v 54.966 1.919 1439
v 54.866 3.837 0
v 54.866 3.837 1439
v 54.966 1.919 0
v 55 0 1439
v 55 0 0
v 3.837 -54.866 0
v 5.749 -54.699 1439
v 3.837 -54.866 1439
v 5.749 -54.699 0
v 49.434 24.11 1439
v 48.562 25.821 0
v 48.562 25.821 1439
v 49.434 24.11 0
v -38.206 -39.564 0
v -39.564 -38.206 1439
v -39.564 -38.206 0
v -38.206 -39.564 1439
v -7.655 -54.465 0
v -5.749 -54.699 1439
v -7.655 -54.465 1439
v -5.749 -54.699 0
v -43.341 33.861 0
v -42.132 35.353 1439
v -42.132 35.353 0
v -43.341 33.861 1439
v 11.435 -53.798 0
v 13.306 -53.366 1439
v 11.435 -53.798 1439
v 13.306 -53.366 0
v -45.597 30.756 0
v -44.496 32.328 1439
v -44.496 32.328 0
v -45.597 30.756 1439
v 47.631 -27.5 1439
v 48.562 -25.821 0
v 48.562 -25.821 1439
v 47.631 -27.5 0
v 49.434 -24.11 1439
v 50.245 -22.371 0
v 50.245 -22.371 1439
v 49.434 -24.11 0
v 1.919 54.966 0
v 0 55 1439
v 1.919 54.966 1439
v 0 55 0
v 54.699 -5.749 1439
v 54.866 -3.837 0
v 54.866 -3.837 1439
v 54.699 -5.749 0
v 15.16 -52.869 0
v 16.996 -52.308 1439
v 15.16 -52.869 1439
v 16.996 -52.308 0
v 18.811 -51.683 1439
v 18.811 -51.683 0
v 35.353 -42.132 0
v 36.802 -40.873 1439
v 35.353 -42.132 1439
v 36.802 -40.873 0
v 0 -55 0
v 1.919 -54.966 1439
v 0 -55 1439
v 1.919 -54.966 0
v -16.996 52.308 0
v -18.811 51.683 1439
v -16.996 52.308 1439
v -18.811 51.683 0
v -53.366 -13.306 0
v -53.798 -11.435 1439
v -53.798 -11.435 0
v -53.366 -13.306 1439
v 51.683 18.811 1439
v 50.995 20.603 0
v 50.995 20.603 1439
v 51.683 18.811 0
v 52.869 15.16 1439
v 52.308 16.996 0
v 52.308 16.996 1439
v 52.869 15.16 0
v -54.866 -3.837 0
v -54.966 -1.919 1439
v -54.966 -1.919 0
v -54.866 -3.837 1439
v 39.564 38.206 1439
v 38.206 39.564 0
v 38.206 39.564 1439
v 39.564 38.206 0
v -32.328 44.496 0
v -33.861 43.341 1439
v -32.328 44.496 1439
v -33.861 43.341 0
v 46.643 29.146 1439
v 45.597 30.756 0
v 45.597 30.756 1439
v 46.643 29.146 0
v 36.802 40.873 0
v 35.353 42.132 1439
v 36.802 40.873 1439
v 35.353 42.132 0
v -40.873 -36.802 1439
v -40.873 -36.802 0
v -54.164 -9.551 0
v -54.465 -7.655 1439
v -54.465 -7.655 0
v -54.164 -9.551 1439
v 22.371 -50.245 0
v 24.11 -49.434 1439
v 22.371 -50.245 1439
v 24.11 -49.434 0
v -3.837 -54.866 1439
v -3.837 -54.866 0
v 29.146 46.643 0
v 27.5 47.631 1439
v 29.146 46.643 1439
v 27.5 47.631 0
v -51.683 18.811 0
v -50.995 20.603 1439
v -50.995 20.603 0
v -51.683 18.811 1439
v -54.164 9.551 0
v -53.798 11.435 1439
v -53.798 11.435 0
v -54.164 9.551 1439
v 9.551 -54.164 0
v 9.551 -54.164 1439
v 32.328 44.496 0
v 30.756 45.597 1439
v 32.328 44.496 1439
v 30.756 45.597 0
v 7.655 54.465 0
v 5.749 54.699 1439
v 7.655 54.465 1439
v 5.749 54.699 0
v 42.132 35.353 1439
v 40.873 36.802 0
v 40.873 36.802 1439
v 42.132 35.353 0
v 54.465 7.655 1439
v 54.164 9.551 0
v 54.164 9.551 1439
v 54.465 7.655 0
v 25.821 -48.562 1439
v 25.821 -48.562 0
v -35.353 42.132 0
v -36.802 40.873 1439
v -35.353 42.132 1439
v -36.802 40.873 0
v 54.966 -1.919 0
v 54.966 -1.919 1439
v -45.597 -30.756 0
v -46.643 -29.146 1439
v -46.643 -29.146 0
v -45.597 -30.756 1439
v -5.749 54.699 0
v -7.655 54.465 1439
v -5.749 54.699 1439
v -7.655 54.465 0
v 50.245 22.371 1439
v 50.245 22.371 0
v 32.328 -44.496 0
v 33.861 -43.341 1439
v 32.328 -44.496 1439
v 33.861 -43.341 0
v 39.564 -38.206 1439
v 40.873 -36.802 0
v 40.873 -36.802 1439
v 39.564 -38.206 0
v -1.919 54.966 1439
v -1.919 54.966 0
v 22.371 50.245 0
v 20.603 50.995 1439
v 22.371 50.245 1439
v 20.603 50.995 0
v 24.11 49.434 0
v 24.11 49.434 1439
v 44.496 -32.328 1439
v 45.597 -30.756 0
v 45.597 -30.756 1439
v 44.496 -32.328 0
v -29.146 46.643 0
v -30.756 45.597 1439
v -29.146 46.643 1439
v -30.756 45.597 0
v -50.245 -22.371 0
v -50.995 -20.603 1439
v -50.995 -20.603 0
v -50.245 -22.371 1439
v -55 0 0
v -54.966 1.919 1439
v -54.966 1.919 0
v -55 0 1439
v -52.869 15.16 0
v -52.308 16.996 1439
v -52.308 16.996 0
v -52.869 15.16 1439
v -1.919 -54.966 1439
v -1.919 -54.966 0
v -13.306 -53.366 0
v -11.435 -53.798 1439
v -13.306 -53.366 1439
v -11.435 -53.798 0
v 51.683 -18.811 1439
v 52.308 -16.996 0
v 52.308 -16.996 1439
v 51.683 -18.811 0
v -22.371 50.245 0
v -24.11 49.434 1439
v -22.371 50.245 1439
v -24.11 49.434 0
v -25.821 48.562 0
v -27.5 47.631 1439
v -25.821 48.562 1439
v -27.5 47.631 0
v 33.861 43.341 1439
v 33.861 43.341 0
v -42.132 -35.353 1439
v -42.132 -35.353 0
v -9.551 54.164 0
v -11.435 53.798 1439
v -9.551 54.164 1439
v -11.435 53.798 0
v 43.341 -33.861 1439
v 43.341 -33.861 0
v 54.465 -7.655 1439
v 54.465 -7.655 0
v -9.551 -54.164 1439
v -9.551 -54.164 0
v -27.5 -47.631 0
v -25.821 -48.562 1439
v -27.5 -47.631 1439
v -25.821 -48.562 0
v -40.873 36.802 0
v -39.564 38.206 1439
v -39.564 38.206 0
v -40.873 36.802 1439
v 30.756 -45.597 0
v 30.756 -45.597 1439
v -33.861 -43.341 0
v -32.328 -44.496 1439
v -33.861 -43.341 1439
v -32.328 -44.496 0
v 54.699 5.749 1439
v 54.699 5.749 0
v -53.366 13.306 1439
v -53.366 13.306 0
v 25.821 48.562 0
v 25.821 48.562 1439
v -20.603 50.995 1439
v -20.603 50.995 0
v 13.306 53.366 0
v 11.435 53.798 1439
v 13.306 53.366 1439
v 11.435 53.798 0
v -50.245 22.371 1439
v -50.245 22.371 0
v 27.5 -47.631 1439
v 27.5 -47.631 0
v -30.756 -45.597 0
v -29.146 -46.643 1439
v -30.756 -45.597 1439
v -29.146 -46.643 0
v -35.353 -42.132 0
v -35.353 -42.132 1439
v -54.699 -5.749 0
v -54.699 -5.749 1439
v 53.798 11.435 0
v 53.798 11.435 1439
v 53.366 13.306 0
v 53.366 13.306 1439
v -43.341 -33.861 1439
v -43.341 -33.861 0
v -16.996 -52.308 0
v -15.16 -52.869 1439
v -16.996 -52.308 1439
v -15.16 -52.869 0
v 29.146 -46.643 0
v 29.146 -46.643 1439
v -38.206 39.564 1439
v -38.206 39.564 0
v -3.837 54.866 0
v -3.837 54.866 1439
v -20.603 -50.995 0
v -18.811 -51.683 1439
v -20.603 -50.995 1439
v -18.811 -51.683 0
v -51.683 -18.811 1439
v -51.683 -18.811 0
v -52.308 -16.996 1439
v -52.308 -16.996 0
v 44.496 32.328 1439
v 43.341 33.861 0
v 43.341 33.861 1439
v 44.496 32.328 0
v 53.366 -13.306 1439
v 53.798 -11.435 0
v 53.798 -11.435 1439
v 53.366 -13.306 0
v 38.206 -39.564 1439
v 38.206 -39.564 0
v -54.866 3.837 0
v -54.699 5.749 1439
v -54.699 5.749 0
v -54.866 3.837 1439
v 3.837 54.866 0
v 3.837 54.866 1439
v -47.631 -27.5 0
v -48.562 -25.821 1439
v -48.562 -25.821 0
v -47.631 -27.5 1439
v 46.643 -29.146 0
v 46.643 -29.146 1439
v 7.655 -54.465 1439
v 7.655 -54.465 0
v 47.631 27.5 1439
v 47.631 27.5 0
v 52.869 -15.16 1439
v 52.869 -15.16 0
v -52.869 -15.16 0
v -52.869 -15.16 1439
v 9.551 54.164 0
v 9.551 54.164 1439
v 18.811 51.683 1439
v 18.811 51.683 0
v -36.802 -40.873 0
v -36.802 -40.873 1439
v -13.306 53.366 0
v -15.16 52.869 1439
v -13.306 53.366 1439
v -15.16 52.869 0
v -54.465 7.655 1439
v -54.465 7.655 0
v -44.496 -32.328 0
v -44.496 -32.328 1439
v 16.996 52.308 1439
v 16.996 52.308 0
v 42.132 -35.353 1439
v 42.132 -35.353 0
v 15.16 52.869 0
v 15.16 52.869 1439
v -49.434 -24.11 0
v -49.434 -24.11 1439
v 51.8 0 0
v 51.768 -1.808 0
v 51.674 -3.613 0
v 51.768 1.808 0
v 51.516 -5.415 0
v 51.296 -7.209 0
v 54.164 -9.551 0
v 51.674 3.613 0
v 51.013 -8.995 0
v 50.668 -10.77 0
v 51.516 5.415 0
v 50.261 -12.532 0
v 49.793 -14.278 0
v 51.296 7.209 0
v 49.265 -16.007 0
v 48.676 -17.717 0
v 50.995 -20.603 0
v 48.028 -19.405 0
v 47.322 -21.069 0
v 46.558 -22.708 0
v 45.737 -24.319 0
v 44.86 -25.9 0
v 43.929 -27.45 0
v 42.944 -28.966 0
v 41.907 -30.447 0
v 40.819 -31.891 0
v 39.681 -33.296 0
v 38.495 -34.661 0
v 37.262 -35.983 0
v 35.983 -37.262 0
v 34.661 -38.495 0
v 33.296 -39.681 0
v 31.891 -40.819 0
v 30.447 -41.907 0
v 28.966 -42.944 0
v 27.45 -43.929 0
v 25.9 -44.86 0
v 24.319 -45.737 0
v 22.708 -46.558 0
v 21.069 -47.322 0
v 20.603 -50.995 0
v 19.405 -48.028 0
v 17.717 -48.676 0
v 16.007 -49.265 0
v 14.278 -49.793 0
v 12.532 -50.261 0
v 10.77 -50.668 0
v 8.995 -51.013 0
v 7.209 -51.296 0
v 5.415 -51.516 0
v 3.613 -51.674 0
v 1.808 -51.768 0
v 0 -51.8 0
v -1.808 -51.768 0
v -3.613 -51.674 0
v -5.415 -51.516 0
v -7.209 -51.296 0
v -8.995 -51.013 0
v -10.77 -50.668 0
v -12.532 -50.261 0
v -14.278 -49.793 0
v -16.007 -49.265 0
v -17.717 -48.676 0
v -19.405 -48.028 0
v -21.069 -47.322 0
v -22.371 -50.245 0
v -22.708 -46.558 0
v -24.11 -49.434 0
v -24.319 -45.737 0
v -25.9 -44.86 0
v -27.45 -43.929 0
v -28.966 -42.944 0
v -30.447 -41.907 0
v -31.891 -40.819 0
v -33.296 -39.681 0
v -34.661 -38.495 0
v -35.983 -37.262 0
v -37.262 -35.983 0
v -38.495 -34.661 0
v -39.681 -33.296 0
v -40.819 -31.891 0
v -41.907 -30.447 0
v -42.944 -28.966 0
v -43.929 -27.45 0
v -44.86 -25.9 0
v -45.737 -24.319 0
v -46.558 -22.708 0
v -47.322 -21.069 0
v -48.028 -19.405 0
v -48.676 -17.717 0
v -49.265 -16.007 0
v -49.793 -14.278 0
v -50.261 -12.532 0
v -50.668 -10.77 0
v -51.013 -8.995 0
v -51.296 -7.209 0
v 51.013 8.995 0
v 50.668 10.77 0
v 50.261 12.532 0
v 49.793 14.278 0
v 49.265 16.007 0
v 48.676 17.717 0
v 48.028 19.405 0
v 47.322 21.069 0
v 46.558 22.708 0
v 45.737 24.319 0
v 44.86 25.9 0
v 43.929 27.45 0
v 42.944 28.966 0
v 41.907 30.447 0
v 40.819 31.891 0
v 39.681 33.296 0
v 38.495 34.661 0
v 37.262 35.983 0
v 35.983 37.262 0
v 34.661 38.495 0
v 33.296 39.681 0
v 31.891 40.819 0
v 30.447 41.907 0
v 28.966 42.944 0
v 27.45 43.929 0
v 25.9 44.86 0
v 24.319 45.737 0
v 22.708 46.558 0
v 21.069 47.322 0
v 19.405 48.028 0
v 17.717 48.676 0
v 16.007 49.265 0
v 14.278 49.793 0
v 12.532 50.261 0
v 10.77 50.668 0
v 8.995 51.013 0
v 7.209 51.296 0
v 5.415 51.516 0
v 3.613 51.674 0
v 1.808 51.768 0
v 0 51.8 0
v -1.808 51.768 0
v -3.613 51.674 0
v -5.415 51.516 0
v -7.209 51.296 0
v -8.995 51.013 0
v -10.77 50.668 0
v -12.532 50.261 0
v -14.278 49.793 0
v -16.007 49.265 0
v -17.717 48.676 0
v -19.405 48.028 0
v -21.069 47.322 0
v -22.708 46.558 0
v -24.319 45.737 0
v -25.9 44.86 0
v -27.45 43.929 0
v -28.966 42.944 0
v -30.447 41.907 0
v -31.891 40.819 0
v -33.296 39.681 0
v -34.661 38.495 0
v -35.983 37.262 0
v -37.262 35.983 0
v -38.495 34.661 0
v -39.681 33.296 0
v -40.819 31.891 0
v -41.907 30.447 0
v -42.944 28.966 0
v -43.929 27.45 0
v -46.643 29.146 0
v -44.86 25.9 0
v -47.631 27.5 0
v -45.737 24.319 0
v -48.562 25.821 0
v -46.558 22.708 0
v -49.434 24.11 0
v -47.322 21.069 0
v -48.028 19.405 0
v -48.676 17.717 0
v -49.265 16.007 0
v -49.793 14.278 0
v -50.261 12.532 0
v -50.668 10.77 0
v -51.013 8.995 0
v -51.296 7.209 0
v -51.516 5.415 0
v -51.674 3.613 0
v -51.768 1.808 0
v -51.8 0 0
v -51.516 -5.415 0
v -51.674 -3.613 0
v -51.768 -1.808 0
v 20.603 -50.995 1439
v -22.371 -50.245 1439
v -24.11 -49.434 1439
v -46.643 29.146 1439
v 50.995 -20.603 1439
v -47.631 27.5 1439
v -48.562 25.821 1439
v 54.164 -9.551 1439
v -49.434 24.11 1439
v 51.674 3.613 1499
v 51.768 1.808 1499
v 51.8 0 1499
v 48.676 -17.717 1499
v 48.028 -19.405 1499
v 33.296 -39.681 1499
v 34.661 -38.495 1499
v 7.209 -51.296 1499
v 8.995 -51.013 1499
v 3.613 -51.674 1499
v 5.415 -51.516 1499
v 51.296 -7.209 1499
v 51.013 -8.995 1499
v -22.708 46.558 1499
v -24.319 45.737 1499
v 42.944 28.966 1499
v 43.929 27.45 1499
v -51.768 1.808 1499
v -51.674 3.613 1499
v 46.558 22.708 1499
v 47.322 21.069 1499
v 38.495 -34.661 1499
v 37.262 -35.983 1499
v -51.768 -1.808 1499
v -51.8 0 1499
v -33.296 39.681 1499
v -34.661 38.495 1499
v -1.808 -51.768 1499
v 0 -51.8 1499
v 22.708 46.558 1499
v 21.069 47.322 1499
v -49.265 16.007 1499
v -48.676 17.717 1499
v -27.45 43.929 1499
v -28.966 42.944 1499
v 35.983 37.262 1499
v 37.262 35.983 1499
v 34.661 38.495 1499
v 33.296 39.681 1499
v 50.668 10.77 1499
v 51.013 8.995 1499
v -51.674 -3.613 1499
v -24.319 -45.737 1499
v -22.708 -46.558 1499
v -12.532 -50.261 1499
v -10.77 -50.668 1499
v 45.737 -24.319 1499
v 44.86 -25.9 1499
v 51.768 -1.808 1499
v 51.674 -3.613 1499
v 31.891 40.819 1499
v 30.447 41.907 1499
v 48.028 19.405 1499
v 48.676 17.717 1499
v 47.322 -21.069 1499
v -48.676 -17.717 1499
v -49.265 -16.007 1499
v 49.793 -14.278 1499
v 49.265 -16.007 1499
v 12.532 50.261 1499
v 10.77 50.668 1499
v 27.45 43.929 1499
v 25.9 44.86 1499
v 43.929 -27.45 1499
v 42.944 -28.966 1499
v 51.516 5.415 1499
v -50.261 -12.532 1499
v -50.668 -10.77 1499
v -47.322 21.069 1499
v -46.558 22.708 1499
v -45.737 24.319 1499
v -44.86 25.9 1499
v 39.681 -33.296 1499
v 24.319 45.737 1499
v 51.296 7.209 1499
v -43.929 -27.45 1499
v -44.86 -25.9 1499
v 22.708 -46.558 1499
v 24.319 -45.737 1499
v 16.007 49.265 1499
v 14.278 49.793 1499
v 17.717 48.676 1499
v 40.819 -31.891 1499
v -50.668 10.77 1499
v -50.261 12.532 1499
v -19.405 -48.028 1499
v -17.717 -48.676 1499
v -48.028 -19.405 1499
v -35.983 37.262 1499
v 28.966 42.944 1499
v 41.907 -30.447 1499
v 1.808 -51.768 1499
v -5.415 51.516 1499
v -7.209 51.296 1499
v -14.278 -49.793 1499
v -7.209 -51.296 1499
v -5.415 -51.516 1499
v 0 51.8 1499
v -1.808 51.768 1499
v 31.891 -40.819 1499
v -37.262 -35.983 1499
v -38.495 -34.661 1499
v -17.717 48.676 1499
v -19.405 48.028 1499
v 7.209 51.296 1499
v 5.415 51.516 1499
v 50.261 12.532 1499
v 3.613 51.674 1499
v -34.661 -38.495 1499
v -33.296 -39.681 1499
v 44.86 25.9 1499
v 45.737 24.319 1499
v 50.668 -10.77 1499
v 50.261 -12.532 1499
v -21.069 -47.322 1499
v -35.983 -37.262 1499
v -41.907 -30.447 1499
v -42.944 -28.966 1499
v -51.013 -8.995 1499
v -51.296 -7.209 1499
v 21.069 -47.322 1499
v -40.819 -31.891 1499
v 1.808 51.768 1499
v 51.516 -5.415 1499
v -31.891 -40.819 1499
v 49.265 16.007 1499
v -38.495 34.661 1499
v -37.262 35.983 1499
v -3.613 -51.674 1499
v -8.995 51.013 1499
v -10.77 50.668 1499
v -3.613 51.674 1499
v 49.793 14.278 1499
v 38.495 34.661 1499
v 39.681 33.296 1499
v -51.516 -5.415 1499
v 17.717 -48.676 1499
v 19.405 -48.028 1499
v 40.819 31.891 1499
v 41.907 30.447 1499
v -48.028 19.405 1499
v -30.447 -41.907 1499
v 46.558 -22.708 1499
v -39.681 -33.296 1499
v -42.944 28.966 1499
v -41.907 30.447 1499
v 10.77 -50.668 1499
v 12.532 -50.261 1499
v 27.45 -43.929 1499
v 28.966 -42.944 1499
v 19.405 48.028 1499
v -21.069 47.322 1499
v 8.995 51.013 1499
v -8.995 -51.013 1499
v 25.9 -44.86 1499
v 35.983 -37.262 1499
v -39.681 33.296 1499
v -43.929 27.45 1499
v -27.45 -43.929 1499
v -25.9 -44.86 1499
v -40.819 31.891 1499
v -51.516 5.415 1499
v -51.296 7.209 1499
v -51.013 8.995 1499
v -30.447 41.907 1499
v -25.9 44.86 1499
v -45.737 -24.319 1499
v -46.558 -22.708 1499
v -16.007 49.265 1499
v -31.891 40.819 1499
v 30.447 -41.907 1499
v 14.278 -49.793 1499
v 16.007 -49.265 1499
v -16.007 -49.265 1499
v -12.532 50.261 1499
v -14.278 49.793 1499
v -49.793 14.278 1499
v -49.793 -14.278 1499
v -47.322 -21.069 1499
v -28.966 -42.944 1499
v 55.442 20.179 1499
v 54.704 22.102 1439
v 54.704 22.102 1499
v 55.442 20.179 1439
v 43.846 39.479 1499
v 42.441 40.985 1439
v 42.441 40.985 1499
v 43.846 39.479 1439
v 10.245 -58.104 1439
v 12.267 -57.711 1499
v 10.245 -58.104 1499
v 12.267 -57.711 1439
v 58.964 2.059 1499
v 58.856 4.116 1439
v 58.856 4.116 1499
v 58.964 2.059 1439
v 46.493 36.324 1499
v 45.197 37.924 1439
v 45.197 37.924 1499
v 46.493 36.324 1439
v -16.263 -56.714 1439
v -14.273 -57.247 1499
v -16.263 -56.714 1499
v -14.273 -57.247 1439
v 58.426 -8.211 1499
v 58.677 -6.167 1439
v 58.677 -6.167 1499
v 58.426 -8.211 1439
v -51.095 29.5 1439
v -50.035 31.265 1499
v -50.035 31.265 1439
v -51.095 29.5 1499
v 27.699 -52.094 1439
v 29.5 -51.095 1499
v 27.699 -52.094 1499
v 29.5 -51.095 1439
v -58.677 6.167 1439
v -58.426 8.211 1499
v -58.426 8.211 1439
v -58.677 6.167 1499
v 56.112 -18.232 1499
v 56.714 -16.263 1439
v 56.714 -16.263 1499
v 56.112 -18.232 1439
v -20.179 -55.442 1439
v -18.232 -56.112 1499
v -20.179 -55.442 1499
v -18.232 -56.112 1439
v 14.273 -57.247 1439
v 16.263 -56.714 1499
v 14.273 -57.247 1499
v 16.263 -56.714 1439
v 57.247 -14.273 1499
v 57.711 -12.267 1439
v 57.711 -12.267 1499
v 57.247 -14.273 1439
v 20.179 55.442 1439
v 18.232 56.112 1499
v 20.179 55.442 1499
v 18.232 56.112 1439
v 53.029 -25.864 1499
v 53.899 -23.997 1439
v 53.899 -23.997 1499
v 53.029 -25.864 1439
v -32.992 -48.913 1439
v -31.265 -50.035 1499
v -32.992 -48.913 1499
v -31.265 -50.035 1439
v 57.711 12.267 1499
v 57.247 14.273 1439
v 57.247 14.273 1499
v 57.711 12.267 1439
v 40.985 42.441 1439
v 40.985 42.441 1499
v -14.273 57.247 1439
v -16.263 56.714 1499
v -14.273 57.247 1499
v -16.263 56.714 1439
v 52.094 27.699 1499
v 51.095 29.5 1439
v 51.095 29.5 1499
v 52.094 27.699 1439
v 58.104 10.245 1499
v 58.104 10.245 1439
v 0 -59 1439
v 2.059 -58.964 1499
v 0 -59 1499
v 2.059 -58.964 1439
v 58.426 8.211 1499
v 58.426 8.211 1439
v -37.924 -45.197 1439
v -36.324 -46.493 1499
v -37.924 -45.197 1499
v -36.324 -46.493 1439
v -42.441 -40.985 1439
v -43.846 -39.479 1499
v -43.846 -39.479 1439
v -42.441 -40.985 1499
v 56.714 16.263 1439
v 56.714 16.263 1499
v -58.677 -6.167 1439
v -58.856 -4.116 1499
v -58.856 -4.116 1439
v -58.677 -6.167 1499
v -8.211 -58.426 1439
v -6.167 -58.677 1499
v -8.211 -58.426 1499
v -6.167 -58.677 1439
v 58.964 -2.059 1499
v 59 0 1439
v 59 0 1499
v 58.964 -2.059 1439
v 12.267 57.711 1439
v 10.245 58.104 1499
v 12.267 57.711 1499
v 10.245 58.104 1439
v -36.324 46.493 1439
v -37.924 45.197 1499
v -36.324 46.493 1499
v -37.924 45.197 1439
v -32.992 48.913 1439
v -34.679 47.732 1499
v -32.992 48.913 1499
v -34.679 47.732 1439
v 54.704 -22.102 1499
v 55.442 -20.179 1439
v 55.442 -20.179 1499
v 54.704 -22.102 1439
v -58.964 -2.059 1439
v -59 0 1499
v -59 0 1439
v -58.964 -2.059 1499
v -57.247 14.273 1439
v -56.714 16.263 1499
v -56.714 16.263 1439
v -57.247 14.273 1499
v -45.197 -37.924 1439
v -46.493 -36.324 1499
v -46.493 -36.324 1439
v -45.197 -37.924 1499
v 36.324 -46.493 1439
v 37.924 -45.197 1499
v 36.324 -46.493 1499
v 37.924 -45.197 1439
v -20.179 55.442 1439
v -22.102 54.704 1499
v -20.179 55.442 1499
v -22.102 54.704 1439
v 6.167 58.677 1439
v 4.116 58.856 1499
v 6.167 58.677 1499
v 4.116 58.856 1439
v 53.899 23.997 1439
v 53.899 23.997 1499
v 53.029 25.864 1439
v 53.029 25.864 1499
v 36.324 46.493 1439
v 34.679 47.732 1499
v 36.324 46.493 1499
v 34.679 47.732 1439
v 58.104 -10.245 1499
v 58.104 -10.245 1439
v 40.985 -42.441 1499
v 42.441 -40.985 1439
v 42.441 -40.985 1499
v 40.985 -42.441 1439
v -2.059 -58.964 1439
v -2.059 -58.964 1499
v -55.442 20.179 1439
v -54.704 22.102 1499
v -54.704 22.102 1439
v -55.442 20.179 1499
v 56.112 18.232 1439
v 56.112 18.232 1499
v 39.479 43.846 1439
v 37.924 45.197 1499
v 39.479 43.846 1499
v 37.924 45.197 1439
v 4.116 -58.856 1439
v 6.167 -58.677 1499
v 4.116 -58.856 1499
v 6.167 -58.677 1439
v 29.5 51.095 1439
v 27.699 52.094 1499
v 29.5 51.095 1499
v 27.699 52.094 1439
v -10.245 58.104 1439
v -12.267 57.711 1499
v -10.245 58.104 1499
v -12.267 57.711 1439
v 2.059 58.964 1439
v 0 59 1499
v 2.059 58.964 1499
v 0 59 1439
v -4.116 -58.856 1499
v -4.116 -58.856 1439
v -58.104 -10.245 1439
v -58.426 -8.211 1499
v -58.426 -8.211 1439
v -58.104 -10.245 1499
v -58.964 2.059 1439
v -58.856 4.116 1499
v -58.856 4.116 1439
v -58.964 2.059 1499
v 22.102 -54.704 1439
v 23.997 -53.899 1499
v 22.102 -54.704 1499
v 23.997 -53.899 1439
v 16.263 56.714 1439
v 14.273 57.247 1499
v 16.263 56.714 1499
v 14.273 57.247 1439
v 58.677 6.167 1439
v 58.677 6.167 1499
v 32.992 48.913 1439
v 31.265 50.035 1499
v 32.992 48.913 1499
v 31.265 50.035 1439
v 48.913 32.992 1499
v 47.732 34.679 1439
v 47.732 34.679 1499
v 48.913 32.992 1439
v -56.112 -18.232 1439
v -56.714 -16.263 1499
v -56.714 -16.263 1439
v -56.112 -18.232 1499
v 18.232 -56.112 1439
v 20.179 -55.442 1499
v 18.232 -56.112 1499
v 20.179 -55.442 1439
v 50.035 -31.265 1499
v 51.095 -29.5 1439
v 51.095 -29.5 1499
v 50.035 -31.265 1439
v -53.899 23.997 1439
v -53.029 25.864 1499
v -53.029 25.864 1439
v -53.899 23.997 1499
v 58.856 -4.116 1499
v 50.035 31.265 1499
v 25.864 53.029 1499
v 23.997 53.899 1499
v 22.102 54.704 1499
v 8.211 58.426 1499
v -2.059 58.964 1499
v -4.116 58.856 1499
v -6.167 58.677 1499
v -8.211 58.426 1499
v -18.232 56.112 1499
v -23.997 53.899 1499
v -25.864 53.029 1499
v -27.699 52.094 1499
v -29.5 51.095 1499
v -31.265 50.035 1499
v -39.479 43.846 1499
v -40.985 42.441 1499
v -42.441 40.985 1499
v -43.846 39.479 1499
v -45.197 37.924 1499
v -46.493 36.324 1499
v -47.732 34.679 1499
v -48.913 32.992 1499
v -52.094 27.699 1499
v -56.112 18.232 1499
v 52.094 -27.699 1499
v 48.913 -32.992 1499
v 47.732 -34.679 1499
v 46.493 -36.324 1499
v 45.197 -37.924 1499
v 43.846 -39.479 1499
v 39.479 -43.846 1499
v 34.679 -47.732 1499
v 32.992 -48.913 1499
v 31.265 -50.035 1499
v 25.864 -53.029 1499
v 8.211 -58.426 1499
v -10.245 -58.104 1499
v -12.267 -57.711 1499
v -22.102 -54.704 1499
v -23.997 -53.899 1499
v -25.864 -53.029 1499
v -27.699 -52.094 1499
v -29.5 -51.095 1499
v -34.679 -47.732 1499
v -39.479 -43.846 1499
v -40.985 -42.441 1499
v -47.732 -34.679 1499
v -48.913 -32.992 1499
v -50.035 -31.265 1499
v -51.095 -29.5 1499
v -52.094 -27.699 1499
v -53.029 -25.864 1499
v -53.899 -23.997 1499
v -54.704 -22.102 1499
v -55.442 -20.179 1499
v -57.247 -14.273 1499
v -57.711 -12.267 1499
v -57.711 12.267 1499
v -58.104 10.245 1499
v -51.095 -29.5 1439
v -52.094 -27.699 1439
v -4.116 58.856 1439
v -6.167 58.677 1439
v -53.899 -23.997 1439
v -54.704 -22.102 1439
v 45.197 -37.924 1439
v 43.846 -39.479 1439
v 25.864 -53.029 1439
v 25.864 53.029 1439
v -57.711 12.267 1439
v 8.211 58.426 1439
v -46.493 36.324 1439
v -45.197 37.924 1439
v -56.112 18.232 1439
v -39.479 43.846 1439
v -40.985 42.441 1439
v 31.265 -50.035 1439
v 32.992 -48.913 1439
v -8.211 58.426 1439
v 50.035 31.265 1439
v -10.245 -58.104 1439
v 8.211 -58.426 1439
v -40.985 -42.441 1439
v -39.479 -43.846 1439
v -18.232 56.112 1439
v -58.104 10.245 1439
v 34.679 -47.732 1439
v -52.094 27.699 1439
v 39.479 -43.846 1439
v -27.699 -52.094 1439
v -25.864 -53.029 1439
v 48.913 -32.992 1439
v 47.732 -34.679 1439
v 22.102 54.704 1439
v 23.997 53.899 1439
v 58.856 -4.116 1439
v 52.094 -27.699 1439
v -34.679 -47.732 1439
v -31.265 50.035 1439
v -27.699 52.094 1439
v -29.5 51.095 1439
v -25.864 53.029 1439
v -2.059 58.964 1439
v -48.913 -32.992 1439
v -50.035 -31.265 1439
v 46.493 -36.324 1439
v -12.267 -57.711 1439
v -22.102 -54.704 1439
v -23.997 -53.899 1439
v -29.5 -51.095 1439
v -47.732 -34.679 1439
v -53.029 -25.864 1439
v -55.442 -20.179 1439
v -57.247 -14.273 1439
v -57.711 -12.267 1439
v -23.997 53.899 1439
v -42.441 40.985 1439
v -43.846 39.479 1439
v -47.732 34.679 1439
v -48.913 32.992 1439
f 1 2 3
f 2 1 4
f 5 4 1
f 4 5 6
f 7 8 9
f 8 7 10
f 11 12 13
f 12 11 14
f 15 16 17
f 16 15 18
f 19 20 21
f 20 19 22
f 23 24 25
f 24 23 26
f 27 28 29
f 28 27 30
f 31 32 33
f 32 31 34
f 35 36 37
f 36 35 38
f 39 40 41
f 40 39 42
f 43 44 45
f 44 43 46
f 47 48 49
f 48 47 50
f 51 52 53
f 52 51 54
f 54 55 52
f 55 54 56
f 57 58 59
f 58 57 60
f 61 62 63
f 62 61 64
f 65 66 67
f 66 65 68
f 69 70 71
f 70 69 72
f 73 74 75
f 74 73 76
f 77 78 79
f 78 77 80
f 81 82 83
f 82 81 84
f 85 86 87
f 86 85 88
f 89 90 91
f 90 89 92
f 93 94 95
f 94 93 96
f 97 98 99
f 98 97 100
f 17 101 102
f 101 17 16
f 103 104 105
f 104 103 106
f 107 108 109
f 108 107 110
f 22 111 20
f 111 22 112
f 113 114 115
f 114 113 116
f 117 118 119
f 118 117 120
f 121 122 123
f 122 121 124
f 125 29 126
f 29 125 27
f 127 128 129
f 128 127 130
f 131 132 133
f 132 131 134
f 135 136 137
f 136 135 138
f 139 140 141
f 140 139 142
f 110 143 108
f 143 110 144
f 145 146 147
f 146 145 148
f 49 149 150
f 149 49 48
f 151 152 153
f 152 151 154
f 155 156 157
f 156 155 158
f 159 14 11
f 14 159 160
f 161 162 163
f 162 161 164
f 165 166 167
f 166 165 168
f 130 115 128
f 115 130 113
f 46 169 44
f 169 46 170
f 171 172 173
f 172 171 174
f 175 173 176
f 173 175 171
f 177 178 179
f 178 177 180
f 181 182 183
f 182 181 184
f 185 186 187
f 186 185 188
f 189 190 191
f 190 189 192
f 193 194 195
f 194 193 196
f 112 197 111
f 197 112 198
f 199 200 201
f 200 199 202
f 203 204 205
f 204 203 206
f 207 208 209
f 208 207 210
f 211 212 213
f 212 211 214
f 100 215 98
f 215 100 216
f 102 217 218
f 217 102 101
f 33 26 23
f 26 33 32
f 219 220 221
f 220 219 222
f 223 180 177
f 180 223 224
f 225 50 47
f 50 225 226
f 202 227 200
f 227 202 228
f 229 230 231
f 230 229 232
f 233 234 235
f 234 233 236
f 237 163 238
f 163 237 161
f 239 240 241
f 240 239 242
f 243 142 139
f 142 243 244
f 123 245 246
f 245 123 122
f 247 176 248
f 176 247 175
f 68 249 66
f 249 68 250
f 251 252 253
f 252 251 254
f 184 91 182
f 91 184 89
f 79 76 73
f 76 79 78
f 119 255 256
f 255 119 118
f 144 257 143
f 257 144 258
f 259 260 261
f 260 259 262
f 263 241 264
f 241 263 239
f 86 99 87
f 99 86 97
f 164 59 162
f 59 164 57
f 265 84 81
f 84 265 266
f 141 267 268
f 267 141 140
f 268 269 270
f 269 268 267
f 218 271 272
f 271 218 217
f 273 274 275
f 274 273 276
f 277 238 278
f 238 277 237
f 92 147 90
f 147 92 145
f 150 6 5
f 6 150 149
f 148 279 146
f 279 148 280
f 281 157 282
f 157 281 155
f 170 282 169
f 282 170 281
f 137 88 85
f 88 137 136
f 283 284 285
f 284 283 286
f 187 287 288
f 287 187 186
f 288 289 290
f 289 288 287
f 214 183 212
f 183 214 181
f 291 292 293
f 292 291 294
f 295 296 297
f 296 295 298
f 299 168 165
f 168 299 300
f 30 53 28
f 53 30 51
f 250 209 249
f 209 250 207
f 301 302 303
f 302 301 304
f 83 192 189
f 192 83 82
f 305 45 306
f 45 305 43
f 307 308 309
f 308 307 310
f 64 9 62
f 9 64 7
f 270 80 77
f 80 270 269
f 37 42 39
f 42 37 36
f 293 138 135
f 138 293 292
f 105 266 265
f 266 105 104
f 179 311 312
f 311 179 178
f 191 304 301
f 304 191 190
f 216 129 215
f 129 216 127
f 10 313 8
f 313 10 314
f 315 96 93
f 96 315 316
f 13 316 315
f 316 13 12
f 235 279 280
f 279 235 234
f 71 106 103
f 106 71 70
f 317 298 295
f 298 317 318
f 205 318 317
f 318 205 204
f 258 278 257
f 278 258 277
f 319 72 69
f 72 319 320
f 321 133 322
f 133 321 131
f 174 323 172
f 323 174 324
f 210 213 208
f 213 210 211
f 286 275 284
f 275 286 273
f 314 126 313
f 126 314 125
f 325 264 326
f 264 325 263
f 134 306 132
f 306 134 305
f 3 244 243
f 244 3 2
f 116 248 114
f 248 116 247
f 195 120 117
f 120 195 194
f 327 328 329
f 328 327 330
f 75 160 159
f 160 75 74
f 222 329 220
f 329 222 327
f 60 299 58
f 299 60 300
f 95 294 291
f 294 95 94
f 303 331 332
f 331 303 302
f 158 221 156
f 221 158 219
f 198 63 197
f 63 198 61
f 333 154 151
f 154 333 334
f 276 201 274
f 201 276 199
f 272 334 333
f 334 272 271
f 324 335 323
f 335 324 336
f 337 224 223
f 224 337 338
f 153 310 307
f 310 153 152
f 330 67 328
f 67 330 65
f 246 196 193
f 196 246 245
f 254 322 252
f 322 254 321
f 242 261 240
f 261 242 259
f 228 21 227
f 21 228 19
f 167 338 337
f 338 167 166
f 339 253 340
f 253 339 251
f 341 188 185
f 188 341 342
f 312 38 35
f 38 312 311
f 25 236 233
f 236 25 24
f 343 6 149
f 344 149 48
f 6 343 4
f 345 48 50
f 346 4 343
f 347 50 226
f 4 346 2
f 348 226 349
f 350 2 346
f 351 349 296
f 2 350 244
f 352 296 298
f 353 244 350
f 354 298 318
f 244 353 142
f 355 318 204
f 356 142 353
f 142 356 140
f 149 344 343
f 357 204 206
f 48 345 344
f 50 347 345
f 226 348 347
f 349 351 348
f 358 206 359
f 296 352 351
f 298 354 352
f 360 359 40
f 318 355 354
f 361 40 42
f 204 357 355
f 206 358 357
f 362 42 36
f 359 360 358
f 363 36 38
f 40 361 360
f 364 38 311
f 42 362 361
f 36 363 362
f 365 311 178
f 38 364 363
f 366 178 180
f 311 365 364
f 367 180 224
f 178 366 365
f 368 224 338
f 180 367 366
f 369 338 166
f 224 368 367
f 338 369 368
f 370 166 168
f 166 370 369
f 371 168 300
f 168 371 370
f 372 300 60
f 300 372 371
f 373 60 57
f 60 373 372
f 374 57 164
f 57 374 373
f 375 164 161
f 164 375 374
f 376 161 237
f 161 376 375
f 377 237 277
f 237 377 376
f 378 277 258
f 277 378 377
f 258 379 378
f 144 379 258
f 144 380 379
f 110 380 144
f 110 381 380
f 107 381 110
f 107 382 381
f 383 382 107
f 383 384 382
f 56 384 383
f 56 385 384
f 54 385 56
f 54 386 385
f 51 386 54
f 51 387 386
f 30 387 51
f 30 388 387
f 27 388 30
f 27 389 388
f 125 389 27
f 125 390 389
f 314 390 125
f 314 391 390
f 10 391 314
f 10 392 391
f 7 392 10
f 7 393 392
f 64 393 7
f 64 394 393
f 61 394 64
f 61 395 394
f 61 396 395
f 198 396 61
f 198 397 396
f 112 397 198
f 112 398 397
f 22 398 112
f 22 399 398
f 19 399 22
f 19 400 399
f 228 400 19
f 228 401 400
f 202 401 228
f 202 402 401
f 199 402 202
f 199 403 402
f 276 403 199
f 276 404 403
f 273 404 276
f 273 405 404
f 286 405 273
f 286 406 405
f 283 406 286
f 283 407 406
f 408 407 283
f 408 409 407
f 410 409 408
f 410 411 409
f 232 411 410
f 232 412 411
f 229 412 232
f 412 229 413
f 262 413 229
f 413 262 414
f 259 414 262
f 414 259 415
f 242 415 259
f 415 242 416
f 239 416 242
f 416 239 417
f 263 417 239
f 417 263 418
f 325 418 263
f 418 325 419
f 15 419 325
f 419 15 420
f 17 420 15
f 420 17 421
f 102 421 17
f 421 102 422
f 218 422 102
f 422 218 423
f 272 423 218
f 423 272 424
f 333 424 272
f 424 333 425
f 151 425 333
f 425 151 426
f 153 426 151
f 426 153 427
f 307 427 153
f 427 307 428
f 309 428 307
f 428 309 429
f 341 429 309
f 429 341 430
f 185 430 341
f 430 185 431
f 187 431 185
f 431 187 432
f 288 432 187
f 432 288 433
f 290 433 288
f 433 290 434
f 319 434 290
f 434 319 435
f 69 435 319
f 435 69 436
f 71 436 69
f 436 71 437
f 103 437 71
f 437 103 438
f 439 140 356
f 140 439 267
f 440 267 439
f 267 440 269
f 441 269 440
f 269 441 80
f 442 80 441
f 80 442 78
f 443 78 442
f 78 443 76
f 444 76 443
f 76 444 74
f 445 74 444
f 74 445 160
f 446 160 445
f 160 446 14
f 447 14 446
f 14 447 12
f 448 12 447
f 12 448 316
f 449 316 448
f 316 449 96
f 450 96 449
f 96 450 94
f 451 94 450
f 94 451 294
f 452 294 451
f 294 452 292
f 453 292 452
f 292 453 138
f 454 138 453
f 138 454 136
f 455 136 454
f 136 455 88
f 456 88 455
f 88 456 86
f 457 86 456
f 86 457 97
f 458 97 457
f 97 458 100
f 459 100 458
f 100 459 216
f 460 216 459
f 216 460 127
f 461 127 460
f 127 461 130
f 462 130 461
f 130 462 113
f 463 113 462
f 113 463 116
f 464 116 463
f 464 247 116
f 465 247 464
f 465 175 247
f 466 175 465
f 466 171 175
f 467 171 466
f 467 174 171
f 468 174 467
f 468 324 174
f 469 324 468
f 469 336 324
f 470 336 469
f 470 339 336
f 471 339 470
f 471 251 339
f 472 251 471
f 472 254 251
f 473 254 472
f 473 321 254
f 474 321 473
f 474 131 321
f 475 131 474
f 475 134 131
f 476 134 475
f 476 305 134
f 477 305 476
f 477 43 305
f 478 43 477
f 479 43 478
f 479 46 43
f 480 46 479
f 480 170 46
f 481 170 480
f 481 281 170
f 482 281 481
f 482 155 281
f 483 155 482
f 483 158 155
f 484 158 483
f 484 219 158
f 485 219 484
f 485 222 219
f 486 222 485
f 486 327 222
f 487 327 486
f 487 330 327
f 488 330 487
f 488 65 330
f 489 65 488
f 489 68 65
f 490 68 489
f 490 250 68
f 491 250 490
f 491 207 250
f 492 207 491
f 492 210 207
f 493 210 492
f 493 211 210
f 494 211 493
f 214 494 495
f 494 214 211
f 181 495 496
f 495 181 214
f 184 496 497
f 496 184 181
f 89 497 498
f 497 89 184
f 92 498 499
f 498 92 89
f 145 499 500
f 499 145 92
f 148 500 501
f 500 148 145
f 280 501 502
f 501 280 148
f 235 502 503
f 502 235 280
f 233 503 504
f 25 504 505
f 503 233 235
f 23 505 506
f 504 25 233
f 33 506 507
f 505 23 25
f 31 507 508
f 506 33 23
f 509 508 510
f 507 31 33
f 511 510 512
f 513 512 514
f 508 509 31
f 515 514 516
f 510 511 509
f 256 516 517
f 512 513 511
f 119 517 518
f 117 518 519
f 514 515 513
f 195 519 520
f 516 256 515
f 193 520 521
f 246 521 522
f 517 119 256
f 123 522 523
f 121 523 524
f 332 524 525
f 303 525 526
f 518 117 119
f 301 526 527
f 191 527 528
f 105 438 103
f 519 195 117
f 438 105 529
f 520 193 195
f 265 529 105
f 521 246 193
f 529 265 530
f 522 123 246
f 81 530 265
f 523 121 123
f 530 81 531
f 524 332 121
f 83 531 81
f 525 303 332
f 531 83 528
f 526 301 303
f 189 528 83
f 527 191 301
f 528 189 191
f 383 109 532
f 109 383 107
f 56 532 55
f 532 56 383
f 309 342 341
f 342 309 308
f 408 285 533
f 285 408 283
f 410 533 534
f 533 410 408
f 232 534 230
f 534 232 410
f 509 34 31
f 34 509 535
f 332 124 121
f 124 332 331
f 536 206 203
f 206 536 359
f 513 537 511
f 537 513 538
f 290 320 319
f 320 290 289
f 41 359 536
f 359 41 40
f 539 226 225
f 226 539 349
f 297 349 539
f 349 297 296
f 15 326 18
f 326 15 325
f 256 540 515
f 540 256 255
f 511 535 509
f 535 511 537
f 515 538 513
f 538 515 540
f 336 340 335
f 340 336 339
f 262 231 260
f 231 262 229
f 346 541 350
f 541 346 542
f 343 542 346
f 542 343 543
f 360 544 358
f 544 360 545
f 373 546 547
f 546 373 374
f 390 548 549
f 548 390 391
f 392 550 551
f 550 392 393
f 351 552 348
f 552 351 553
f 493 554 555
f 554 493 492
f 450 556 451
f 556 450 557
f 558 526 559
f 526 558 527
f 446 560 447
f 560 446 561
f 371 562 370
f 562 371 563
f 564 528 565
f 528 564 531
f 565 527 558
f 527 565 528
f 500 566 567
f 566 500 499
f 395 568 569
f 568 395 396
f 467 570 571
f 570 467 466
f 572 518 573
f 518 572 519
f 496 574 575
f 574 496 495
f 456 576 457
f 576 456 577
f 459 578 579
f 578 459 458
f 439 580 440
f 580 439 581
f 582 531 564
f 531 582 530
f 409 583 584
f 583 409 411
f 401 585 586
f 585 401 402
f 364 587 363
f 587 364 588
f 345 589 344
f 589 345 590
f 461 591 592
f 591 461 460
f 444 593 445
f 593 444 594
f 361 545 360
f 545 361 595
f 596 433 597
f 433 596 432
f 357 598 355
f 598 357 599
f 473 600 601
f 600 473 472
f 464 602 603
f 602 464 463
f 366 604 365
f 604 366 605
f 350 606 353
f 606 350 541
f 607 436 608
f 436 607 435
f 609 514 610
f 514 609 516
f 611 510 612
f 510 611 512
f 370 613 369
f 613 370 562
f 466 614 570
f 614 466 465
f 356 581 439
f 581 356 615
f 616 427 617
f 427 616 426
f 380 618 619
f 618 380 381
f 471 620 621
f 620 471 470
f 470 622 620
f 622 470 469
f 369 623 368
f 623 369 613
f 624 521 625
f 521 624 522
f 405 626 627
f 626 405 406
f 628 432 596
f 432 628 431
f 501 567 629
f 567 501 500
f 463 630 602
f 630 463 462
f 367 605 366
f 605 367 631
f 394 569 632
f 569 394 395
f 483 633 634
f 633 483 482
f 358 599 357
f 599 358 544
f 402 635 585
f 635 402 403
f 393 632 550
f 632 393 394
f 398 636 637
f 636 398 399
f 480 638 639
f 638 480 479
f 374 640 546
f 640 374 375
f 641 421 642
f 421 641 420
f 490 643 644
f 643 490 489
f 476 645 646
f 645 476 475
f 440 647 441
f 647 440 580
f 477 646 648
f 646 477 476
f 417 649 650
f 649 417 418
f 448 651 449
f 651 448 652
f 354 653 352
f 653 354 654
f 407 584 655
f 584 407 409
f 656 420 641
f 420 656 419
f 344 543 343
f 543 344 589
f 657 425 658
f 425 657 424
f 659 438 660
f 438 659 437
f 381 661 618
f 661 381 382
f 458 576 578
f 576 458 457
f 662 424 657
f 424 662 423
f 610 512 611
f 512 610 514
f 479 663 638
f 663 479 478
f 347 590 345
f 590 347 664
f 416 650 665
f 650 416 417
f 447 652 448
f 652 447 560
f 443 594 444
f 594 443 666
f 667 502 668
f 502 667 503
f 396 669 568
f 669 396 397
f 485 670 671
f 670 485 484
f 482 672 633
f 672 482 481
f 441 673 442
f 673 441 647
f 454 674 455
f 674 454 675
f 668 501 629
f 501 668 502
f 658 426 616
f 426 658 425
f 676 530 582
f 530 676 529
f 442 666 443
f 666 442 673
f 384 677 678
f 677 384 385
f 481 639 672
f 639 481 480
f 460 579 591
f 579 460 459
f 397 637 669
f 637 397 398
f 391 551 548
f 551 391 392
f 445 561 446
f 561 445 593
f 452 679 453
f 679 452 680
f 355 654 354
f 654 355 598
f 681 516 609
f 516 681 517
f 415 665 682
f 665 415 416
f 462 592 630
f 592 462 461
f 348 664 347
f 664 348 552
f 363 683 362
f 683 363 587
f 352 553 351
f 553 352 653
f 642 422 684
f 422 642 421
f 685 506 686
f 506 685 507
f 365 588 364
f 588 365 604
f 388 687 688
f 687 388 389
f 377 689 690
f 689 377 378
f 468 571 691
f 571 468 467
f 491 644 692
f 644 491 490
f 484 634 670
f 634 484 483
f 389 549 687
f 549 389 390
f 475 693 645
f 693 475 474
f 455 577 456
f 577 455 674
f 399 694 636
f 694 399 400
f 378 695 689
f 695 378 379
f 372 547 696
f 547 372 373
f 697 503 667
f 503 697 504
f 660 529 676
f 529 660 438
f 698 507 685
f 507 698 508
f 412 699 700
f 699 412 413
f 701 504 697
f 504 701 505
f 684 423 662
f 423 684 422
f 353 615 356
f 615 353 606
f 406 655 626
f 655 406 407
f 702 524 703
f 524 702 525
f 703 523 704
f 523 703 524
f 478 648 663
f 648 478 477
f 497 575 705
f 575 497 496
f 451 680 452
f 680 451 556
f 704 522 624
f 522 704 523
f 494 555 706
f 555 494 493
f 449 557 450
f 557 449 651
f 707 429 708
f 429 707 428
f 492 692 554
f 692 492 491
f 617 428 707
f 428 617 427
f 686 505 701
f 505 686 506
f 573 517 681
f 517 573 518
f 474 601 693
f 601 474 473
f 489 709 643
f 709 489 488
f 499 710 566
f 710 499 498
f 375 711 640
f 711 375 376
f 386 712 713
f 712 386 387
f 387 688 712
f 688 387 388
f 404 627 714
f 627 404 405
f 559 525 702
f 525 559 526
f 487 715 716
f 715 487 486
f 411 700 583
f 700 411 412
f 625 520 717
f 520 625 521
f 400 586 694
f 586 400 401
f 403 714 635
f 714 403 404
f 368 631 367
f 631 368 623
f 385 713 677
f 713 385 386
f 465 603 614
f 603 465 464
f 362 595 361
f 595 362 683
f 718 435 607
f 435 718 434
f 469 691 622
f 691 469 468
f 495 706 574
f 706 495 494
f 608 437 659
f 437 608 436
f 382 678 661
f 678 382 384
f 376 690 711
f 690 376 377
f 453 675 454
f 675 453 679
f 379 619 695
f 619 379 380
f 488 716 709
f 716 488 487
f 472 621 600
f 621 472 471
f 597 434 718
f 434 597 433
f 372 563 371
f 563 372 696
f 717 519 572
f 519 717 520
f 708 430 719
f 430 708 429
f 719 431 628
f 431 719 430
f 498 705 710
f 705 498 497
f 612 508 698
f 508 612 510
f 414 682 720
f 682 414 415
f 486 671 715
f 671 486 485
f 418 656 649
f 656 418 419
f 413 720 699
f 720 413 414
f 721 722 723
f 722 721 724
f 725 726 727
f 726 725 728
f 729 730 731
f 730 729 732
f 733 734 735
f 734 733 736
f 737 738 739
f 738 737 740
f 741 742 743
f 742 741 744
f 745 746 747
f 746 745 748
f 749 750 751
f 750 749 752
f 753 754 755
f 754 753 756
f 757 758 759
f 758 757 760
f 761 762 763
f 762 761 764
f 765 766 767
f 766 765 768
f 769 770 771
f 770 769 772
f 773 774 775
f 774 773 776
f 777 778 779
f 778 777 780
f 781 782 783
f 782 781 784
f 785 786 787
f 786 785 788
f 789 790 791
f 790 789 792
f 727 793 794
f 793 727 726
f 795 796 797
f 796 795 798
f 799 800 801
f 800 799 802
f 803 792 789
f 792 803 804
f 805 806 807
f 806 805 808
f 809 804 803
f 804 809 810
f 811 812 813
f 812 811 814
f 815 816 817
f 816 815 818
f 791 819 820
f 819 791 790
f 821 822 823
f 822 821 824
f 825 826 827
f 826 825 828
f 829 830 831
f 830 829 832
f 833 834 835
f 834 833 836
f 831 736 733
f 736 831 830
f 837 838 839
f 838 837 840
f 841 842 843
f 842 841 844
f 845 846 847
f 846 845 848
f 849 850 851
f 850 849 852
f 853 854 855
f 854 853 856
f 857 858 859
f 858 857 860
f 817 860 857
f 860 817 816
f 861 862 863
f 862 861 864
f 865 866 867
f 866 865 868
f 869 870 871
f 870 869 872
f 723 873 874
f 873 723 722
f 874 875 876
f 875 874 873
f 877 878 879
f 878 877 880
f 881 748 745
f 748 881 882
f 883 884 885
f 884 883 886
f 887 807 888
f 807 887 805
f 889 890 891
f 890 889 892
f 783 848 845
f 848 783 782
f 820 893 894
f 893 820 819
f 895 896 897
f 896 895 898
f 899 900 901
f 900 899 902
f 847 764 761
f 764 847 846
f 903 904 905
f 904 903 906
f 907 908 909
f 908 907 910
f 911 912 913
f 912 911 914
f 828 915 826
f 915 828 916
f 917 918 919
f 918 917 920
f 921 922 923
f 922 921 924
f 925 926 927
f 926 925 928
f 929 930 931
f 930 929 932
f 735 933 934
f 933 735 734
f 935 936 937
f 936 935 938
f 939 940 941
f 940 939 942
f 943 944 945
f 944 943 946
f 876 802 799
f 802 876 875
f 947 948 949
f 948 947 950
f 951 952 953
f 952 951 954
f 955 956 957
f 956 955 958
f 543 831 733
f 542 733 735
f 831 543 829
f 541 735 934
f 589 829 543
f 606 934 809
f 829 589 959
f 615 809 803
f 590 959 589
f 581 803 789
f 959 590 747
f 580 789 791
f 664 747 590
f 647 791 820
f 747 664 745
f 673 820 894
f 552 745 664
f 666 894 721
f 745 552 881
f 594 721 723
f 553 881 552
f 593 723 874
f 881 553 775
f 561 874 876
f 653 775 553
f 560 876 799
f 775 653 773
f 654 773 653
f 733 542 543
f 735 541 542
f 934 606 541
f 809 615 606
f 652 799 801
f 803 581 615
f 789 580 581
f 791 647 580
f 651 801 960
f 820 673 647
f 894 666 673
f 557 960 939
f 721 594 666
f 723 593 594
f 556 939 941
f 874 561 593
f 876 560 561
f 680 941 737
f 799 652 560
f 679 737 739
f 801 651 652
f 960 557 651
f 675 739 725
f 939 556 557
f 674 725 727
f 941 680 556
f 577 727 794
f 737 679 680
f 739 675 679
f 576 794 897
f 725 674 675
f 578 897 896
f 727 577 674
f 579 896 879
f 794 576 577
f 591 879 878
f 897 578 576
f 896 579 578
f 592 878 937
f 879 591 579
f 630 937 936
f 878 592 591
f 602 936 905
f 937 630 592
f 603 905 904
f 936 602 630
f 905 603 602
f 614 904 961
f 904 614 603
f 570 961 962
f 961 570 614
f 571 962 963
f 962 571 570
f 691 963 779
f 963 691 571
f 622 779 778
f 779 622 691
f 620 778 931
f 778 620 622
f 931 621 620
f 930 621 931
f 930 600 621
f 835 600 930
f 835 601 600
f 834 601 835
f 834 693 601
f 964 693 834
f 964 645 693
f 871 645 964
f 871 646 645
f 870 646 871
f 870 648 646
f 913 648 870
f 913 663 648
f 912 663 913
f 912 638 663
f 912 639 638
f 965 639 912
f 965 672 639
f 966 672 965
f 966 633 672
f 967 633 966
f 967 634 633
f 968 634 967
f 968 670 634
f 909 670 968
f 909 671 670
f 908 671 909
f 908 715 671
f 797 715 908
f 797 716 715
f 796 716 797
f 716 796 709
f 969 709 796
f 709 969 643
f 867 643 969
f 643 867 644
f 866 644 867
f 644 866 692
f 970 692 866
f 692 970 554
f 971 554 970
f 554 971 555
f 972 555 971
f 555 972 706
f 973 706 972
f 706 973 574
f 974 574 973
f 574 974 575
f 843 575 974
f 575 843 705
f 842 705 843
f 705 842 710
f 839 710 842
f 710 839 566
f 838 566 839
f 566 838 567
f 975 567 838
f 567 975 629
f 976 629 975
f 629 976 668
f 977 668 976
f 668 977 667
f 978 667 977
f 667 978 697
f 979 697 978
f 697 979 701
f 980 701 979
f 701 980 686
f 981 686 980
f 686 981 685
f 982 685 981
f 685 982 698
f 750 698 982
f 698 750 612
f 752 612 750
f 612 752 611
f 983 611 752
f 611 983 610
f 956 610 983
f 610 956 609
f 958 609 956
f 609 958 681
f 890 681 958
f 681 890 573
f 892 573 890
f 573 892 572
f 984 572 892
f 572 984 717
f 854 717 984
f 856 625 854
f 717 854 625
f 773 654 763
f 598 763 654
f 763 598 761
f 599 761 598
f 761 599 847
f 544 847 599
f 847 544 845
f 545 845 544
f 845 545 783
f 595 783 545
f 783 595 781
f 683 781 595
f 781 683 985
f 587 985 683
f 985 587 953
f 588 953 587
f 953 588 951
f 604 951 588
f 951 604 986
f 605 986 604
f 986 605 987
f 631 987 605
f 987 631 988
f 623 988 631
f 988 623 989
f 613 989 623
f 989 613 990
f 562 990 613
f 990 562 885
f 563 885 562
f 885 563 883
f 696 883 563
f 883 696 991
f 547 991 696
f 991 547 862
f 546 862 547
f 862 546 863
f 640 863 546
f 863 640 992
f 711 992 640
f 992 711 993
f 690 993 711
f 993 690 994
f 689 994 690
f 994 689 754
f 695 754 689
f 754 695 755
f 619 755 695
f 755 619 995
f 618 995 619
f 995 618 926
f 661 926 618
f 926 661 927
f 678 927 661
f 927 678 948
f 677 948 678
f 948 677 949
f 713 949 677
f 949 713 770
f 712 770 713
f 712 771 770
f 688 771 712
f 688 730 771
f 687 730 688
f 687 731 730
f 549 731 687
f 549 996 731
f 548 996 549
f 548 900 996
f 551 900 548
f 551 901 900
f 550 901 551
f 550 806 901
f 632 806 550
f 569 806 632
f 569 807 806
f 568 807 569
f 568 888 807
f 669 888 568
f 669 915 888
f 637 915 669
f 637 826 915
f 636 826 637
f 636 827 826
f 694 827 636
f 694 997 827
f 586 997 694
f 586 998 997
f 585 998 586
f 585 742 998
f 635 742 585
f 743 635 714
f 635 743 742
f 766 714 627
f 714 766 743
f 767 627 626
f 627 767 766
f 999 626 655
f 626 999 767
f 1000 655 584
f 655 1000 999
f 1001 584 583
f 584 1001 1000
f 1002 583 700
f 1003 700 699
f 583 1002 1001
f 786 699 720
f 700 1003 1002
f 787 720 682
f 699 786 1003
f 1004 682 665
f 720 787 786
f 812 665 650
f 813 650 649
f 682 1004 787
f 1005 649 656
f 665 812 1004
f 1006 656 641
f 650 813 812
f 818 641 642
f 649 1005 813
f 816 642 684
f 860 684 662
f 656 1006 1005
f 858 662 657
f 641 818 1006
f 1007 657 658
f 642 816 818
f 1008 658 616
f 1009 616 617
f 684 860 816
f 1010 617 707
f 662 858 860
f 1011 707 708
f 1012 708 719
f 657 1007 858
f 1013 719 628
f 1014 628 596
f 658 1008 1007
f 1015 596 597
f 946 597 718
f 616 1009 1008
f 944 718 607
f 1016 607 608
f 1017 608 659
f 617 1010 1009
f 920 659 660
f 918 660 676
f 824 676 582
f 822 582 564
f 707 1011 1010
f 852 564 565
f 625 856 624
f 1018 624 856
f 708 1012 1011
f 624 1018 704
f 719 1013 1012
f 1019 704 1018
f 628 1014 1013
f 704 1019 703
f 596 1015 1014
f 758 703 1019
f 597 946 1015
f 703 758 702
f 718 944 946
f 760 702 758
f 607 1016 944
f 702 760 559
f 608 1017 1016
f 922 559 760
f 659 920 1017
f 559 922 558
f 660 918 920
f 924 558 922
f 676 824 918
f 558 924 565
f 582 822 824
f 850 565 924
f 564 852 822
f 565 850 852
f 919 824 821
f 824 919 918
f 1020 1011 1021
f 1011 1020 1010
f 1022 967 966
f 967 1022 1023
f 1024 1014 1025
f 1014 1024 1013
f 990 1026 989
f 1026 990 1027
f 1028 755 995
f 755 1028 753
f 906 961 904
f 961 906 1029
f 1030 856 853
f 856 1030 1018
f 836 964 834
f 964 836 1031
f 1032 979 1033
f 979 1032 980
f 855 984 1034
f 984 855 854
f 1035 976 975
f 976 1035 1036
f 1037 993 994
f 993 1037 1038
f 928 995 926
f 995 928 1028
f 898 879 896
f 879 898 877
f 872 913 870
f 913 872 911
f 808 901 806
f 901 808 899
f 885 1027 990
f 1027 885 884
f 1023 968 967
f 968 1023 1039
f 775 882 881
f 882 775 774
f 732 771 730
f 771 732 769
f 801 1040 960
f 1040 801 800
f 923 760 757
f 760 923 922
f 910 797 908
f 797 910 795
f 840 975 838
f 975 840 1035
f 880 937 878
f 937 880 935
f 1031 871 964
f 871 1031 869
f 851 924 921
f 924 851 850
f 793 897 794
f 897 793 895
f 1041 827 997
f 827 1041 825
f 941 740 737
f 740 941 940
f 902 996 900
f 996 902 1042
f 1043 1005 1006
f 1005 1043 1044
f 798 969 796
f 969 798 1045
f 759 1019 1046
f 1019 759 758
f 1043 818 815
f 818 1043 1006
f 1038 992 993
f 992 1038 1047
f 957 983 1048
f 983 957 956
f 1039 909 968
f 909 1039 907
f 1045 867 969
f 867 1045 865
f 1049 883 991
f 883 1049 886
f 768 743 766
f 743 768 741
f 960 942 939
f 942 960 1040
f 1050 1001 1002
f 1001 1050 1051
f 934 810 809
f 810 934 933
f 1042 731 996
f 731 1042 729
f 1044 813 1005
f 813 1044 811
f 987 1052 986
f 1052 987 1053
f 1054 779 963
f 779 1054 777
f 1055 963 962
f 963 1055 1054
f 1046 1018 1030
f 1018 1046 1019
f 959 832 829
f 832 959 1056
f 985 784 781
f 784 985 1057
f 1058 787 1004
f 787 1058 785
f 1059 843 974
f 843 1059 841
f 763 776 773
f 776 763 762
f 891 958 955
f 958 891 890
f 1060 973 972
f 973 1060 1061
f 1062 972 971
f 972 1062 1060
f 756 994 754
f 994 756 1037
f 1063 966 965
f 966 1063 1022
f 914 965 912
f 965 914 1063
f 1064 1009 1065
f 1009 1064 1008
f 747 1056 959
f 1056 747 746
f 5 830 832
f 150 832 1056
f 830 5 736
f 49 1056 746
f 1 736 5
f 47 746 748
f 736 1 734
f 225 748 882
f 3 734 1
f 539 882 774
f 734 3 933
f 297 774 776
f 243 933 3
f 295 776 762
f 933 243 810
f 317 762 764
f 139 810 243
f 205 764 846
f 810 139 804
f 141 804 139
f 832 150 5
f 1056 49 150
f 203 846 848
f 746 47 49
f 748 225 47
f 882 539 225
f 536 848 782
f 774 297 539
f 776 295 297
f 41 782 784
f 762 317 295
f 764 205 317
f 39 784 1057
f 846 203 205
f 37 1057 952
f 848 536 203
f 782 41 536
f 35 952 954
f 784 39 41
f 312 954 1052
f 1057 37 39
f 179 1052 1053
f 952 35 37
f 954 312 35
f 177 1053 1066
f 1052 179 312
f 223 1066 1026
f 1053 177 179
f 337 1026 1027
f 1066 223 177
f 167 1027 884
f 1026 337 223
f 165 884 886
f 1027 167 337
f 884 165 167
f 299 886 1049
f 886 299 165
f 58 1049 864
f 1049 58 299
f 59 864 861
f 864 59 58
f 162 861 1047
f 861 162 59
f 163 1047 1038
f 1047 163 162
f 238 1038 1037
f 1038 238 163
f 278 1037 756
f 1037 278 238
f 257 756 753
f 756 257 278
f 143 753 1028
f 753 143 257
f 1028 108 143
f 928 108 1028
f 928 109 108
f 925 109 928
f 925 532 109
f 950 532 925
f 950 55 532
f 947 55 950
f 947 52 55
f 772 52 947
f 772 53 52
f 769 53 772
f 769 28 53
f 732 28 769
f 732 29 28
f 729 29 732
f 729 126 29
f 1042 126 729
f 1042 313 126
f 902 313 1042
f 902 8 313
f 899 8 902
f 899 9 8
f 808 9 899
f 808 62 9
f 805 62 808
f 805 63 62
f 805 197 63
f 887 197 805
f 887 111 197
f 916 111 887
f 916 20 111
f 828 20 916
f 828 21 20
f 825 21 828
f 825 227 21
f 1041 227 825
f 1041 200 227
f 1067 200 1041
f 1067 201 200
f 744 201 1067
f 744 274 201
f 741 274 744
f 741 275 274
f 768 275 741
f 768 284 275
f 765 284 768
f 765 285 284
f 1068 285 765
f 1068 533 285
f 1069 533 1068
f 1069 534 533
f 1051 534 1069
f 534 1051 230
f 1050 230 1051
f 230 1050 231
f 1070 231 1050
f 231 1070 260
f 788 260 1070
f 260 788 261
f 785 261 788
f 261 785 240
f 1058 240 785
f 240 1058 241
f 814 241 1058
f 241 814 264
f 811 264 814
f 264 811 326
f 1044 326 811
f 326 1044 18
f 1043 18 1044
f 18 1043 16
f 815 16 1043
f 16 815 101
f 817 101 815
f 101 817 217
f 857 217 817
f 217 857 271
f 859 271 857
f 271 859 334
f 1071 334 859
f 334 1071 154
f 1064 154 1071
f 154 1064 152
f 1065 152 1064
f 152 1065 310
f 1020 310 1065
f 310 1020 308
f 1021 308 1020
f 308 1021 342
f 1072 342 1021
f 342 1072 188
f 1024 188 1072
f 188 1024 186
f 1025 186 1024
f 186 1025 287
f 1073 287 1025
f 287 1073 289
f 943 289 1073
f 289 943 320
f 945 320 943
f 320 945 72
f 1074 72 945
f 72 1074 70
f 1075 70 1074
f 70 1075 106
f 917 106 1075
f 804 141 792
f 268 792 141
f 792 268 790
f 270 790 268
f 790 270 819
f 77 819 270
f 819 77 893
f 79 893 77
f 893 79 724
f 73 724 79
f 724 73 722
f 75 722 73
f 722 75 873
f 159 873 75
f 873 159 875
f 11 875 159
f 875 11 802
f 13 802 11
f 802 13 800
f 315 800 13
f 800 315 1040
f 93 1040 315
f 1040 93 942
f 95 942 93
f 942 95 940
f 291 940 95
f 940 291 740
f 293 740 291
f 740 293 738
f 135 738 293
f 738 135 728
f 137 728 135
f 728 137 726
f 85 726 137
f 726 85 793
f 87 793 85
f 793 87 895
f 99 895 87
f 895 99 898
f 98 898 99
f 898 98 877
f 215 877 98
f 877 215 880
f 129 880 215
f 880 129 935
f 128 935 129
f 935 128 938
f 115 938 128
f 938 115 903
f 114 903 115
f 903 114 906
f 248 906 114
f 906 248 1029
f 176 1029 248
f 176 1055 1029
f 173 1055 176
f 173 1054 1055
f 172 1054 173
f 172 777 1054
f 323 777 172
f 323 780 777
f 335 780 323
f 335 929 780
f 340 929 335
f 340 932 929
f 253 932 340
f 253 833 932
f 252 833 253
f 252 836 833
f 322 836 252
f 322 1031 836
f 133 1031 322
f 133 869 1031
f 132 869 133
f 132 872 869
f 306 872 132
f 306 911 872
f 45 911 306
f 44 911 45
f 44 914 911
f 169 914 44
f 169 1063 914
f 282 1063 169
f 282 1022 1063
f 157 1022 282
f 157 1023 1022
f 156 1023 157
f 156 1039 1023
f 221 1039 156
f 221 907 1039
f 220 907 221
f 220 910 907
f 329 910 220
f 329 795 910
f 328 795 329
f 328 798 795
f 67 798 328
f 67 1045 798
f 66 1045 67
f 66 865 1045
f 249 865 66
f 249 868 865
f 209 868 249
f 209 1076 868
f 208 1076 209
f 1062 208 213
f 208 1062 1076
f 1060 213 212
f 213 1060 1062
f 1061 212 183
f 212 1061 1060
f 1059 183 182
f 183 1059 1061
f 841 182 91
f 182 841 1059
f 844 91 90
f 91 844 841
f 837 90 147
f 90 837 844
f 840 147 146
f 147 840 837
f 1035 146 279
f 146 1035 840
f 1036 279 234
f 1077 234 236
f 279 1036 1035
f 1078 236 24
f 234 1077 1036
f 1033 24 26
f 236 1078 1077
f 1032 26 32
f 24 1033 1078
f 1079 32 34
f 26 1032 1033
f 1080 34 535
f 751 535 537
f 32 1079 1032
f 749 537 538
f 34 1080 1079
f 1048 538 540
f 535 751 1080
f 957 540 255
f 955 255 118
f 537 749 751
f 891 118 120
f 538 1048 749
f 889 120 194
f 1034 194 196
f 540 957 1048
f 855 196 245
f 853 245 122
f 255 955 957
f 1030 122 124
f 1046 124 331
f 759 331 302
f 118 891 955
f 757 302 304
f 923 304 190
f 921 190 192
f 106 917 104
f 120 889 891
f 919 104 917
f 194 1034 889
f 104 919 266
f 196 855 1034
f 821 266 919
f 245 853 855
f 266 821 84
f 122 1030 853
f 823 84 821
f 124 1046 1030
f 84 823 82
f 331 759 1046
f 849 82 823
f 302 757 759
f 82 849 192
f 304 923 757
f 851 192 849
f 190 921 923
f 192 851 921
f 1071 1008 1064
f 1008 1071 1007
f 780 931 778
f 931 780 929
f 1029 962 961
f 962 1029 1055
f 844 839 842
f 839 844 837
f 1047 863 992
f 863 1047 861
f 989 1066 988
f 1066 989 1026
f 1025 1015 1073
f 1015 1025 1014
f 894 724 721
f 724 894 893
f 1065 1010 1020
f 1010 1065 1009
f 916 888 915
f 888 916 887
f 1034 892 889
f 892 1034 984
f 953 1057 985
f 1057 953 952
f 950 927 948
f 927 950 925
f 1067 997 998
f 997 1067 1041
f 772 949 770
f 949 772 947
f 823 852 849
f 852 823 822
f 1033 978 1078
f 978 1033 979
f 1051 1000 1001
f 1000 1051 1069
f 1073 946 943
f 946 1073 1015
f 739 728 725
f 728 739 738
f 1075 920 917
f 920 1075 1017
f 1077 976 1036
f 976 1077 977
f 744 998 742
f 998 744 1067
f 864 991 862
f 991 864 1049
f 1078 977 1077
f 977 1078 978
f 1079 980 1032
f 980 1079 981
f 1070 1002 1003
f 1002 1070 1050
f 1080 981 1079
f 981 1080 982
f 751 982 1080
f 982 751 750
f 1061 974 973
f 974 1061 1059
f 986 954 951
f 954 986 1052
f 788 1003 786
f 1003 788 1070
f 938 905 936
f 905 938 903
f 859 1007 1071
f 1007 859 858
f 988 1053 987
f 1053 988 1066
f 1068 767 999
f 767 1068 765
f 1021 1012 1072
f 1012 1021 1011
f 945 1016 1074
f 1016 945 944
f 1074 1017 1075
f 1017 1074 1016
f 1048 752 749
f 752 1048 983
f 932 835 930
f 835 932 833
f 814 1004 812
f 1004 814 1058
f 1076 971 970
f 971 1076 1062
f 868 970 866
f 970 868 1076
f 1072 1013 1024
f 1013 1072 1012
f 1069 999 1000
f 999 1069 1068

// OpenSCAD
// Parameters
nominal_diameter_mm = 110; //[55:220:1]
length_mm = 1500; //[750:3000:1]
pipe_wall_mm = 3.2; //[1.6:6.4:0.1]
fitting_length_mm = 60; //[30:120:1]
fitting_radial_thickness_mm = 4; //[2:8:0.5]
connection_overlap_mm = 1; //[0.5:2:0.1]

$fn = 180;

// HT Pipe - one connected solid
module ht_pipe() {
    od_r = nominal_diameter_mm/2;
    id_r = od_r - pipe_wall_mm;

    // Ensure valid geometry
    id_r_safe = max(0.01, id_r);

    body_h = length_mm - fitting_length_mm;
    body_h_safe = max(0.01, body_h);

    // Fitting overlaps into body by connection_overlap_mm
    fit_z = body_h_safe - connection_overlap_mm;

    color([0.85, 0.85, 0.8])
    union() {
        // Main pipe body (hollow)
        difference() {
            cylinder(h=body_h_safe, r=od_r, center=false);
            translate([0, 0, -0.01])
                cylinder(h=body_h_safe + 0.02, r=id_r_safe, center=false);
        }

        // End fitting / socket (hollow), connected via overlap
        translate([0, 0, fit_z])
        difference() {
            cylinder(h=fitting_length_mm, r=od_r + fitting_radial_thickness_mm, center=false);
            translate([0, 0, -0.01])
                cylinder(h=fitting_length_mm + 0.02, r=id_r_safe, center=false);
        }
    }
}

ht_pipe();
